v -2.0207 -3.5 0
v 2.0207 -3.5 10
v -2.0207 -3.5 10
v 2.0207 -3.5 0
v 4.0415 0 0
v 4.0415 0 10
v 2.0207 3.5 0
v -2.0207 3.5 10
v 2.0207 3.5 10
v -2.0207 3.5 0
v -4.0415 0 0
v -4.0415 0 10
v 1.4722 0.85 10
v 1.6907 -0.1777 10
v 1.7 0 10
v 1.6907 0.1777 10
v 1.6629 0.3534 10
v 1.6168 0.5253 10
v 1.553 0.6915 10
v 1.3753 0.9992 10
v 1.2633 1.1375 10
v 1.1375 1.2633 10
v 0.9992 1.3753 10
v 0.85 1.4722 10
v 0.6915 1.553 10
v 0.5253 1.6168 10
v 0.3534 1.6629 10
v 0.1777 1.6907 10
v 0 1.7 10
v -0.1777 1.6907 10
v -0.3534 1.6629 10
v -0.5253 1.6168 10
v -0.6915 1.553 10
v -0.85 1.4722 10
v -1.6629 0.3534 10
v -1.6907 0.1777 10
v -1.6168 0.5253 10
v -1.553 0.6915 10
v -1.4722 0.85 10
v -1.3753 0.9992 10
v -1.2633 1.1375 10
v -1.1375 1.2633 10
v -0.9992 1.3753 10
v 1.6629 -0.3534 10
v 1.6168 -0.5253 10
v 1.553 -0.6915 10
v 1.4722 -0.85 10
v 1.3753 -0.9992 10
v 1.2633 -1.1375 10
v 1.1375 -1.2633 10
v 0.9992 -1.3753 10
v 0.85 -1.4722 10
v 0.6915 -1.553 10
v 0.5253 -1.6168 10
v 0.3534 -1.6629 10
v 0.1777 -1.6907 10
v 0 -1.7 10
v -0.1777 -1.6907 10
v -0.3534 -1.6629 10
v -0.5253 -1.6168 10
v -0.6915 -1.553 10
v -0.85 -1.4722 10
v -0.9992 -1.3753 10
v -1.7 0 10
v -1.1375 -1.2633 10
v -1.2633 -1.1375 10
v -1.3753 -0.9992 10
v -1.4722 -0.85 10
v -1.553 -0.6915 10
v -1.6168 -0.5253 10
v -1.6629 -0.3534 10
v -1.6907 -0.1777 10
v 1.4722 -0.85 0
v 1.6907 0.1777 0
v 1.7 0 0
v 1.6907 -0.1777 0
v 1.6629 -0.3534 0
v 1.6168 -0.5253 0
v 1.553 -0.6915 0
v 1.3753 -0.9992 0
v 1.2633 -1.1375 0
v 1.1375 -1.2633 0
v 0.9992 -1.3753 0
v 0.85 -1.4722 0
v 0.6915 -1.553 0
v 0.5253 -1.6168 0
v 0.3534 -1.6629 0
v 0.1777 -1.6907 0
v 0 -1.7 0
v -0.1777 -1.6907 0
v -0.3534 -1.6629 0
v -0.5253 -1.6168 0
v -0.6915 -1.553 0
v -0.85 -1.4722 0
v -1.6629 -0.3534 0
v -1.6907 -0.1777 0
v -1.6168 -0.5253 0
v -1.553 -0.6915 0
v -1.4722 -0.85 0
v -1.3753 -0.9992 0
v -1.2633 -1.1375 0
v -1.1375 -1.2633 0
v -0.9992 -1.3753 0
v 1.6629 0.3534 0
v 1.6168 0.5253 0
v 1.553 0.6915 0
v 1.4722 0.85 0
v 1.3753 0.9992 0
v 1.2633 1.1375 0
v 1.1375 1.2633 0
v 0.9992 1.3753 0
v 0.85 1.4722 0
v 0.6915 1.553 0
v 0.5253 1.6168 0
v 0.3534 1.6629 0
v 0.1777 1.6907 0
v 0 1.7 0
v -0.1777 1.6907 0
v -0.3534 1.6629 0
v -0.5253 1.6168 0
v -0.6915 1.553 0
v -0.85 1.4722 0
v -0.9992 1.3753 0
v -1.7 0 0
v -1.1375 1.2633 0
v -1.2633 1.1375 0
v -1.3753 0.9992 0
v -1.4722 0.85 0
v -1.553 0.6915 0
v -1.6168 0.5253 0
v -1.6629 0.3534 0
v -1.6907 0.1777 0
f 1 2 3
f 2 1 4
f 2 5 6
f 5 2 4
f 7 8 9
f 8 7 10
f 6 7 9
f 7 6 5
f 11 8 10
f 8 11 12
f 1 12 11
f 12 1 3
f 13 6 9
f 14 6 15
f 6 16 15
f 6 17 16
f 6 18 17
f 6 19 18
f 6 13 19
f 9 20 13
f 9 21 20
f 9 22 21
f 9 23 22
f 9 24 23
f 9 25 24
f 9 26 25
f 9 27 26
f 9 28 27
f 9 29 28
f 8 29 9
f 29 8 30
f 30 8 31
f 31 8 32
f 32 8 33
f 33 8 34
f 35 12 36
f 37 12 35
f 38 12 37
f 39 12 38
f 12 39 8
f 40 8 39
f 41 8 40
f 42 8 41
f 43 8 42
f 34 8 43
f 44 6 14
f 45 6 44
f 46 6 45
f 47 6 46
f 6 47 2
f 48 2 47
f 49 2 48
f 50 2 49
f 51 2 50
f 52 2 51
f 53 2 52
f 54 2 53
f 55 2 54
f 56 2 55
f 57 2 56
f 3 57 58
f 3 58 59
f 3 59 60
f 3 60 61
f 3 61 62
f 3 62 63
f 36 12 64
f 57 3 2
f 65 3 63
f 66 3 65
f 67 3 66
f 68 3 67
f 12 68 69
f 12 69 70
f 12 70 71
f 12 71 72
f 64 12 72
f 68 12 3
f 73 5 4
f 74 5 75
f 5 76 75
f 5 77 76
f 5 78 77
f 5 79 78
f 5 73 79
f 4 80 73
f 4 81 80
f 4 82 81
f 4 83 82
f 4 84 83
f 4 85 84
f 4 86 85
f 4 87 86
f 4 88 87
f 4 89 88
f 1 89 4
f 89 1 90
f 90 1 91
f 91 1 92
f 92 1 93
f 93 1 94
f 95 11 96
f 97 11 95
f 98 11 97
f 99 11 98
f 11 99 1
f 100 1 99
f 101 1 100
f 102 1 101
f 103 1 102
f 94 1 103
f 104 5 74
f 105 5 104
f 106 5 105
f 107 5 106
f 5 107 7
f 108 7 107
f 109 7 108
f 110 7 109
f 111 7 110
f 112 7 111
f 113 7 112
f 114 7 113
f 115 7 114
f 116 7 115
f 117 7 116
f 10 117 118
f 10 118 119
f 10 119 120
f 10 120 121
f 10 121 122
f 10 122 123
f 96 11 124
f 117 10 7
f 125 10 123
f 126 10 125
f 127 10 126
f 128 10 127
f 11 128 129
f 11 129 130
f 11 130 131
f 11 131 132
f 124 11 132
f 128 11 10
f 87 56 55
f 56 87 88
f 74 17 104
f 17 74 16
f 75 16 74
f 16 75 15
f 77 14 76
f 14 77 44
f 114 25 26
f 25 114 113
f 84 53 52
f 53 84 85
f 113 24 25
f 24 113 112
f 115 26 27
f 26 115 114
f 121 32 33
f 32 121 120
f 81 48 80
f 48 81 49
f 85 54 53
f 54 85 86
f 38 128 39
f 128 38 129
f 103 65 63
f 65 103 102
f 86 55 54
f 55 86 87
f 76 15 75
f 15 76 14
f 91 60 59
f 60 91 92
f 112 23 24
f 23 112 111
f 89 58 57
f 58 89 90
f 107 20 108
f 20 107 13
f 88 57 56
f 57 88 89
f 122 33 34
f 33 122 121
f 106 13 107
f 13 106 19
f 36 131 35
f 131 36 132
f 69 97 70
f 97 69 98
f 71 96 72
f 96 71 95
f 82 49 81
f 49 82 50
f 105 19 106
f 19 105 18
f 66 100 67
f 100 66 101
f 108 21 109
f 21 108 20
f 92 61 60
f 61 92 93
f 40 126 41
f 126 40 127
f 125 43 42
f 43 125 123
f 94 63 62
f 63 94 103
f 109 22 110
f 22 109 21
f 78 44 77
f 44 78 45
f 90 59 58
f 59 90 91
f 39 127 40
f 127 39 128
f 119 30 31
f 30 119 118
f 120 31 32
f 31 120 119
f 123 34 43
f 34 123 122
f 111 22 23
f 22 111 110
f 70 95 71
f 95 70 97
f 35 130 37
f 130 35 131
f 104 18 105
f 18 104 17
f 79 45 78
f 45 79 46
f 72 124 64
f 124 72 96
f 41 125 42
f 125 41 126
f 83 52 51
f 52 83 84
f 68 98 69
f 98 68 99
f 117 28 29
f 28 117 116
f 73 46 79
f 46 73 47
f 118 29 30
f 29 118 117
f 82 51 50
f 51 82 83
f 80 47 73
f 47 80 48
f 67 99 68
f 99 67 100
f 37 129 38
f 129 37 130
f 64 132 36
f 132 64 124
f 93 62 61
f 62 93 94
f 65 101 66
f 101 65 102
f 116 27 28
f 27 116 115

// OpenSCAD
// M3 standoff 10 mm: hex-bodied through standoff.
$fn = 60;
eps = 0.02;
thread_clearance_d = 3.4;
outer_flat = 7;
length = 10;
chamfer = 1.2;

difference() {
    union() {
        cylinder(d = outer_flat / cos(30), h = length, $fn = 6);
        cylinder(d1 = outer_flat / cos(30) - 2 * chamfer, d2 = outer_flat / cos(30), h = chamfer, $fn = 6);
        translate([0, 0, length - chamfer])
            cylinder(d1 = outer_flat / cos(30), d2 = outer_flat / cos(30) - 2 * chamfer, h = chamfer, $fn = 6);
    }
    translate([0, 0, -eps]) cylinder(d = thread_clearance_d, h = length + 2 * eps);
}
